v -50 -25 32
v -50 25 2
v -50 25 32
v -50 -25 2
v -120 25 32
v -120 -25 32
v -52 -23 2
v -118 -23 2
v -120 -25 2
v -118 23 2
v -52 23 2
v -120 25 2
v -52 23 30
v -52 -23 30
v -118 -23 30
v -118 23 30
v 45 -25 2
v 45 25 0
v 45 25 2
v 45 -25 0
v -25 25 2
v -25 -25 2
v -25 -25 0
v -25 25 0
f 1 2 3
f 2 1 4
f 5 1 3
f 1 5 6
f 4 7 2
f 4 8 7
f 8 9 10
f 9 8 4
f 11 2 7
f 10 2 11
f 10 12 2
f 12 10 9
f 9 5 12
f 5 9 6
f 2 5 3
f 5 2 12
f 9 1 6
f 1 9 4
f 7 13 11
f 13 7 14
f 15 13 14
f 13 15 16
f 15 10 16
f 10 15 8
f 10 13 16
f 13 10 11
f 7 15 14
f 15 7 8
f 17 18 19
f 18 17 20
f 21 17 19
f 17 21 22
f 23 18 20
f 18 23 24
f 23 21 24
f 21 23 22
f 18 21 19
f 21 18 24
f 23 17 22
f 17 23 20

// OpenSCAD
// Built by bench/smallmodels/features/compiler.py from a list of features.
$fn = 64;
difference() {
  union() {
    translate([-85, 0, 2]) translate([-35, -25, 0]) cube([70, 50, 30]);
  }
  union() {
    translate([-85, 0, 2]) rotate([0, 0, 0]) translate([-33, -23, 0]) cube([66, 46, 28]);
  }
}
union() {
    translate([10, 0, 0]) translate([-35, -25, 0]) cube([70, 50, 2]);
  }
